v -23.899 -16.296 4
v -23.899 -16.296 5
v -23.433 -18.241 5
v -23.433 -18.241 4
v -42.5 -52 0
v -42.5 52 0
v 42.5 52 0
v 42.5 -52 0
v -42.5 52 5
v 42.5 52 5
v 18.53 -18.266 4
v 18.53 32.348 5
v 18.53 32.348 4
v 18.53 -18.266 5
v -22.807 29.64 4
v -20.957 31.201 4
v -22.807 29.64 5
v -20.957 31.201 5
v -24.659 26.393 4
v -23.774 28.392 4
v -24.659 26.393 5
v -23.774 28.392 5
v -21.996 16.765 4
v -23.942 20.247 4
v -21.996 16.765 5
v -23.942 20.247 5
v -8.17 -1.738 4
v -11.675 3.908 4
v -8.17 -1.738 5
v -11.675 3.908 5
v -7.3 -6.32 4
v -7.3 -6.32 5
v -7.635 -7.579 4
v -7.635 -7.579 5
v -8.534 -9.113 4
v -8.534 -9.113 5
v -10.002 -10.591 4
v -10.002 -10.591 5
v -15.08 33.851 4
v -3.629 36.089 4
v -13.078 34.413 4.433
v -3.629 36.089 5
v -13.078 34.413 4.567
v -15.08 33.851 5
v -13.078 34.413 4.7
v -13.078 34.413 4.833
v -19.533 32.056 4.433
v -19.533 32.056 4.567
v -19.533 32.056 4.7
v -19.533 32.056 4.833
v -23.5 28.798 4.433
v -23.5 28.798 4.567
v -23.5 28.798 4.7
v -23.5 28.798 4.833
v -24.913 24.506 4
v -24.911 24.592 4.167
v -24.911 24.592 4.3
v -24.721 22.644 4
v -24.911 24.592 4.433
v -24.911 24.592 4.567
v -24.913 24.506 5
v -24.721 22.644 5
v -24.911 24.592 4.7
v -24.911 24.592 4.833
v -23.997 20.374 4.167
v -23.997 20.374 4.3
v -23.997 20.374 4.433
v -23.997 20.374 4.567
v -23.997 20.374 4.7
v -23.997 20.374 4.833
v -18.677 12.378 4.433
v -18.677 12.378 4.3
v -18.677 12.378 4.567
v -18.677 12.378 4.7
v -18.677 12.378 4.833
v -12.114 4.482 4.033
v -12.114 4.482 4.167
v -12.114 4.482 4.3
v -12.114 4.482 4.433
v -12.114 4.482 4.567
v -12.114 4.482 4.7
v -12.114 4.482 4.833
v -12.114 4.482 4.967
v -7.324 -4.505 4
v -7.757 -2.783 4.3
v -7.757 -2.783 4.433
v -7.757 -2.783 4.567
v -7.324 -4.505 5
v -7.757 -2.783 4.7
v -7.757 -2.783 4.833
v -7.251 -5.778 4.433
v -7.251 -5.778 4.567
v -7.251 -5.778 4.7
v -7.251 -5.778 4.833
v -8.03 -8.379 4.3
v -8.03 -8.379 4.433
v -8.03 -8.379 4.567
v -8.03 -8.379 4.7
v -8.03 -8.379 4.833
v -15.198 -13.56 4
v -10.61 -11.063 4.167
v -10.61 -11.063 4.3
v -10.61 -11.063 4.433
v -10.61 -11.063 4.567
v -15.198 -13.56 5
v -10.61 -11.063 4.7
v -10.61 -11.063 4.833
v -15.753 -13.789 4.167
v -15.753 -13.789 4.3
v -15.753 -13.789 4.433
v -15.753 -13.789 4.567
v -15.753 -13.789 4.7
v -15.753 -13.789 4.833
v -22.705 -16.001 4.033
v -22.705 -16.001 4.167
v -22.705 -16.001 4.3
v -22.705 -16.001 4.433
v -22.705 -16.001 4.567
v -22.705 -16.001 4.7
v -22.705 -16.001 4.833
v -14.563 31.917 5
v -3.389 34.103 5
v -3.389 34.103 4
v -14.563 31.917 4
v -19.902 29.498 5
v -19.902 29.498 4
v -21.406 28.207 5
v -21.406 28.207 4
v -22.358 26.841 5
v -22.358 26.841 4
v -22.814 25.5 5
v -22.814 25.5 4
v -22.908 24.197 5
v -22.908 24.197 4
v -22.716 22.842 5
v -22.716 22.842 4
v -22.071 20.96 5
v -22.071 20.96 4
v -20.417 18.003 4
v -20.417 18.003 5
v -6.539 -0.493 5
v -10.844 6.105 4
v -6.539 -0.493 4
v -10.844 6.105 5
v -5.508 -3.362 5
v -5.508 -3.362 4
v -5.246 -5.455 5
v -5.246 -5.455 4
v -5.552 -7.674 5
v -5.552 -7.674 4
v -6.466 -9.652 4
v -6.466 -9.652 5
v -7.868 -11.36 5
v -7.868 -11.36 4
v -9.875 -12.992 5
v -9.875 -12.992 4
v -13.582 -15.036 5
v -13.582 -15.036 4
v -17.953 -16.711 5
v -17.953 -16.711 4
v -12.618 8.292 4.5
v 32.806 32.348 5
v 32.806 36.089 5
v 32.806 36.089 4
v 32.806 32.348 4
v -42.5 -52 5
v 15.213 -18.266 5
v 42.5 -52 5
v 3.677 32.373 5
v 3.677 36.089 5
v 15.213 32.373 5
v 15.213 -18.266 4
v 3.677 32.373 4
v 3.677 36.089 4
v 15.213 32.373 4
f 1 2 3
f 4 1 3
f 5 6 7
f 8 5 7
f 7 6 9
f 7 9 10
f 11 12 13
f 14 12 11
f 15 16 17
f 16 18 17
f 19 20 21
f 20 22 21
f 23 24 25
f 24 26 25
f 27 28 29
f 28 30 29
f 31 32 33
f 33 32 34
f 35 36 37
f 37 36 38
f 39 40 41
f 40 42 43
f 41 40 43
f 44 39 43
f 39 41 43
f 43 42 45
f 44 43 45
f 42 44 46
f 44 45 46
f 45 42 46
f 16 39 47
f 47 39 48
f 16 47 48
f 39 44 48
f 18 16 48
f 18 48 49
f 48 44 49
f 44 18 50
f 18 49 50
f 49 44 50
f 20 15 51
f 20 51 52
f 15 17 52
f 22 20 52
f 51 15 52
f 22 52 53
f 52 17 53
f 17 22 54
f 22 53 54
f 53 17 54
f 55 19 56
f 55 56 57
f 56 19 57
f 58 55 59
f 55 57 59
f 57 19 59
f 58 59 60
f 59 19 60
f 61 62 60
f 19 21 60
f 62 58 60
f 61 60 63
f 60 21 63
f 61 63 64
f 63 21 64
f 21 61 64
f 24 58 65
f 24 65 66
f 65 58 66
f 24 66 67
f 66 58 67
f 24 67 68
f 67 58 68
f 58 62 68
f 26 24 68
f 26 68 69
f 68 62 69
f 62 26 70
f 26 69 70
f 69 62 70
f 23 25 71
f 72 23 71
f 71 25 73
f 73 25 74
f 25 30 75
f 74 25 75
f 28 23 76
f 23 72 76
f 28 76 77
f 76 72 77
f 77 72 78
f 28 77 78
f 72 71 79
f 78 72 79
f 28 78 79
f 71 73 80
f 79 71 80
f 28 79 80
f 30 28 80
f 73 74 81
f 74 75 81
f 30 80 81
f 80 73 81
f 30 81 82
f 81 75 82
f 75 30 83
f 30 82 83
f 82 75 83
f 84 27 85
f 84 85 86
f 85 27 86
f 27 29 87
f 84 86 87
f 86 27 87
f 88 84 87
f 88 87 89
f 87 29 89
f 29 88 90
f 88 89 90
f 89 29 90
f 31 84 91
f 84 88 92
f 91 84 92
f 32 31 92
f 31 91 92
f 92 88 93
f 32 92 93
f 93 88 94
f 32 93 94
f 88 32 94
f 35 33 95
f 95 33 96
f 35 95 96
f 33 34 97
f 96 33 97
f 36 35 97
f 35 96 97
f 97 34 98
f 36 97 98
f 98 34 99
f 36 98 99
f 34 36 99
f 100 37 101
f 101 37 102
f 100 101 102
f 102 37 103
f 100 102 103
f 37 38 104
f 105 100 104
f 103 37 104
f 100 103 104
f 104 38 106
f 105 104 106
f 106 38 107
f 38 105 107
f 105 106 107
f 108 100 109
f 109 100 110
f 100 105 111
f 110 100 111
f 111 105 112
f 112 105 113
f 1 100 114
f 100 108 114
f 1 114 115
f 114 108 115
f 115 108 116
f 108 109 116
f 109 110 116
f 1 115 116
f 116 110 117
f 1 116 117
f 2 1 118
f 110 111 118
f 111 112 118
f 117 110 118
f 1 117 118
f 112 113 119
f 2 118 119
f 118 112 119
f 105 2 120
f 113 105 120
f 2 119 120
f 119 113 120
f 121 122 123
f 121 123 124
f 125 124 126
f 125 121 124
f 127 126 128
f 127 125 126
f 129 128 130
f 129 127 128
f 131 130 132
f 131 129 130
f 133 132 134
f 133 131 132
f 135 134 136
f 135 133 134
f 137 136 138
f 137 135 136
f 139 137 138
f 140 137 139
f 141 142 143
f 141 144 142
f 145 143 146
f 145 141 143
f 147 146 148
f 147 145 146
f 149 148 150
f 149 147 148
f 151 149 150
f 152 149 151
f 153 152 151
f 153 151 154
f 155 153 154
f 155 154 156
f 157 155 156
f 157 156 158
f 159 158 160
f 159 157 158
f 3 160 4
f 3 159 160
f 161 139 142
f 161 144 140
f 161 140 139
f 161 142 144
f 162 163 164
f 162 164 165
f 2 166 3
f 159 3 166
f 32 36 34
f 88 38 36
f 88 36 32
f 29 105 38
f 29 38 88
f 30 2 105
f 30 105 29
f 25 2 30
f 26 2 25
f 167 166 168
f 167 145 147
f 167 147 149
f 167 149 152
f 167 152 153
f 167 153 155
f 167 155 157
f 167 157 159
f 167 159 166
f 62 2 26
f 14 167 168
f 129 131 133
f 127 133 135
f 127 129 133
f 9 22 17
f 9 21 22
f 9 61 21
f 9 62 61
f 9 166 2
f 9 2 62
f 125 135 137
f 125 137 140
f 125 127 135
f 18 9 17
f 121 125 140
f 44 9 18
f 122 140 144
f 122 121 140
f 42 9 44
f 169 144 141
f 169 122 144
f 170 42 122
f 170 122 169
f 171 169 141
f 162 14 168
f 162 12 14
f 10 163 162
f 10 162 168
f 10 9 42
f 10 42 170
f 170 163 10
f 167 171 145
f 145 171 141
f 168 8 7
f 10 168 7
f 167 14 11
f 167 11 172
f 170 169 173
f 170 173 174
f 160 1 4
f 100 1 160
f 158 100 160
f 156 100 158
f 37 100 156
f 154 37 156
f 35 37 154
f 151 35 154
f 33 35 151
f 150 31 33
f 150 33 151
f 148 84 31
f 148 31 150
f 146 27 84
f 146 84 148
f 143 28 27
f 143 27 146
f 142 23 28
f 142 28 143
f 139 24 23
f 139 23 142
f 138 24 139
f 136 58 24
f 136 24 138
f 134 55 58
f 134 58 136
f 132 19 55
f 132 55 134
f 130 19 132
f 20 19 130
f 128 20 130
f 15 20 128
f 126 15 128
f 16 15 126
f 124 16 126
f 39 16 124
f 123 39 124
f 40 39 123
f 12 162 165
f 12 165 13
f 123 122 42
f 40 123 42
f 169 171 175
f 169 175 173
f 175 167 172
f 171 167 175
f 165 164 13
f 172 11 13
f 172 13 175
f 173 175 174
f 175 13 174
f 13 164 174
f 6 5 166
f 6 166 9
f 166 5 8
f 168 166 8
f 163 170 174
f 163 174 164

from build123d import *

# Parameters (mm, degrees)
ESQUISSE1_W             = 85
ESQUISSE1_H             = 104
BOSS_EXTRU_1_DEPTH      = 5
ENL_V_MAT_EXTRU_1_DEPTH = 1


with BuildPart() as part:
    # Esquisse1 → Boss.-Extru.1 (new body)
    with BuildSketch(Plane.XY):
        Rectangle(ESQUISSE1_W, ESQUISSE1_H)
    extrude(amount=BOSS_EXTRU_1_DEPTH)

    # Esquisse2 → Enlèv. mat.-Extru.1 (cut)
    with BuildSketch(Plane.XY.offset(5)):
        with BuildLine():
            Line((-3.388704743, 34.103347729), (-3.629372262, 36.088814713))
            add(Edge.make_bspline(
                [(-3.629372262, 36.088814713), (-4.08446723, 36.033650574), (-5.006701542, 35.9161817), (-6.746497307, 35.671464418), (-8.798619642, 35.338764173), (-11.051315829, 34.899553303), (-13.794606999, 34.259481961), (-16.756038002, 33.355809903), (-20.588465233, 31.672600674), (-23.248873274, 29.537403505), (-24.667920032, 26.786198992), (-25.012510364, 24.584115997), (-24.750697932, 22.431783349), (-23.816704413, 19.677670295), (-21.84557106, 16.358099799), (-18.729299599, 12.379297822), (-15.297978173, 8.393157934), (-12.02002896, 4.459655747), (-9.304947101, 0.658444927), (-7.548030079, -2.872596094), (-7.129469845, -5.366220488), (-7.41085698, -7.099431702), (-7.956615785, -8.371154177), (-8.945556146, -9.690172763), (-10.501310687, -11.060812544), (-12.710120912, -12.44358626), (-15.141117913, -13.572373646), (-17.46240655, -14.446520725), (-19.395427087, -15.084638487), (-21.175073092, -15.600848156), (-22.692644923, -16.001059417), (-23.500194879, -16.200847405), (-23.898925586, -16.296466212)],
                knots=[0, 0, 0, 0, 0.0078125, 0.015625, 0.03125, 0.046875, 0.0625, 0.09375, 0.125, 0.1875, 0.21875, 0.25, 0.28125, 0.3125, 0.375, 0.4375, 0.5, 0.5625, 0.625, 0.6875, 0.75, 0.78125, 0.8125, 0.84375, 0.875, 0.90625, 0.9375, 0.953125, 0.96875, 0.984375, 0.9921875, 1, 1, 1, 1], degree=3))
            Line((-23.898925586, -16.296466212), (-23.432532795, -18.24132553))
            add(Edge.make_bspline(
                [(-3.388704743, 34.103347729), (-33.854005817, 30.410509476), (-10.88452908, 9.31946477), (2.016071314, -12.138547096), (-23.432532795, -18.24132553)],
                knots=[0, 0, 0, 0, 0.521998932, 1, 1, 1, 1], degree=3))
        make_face()
        Polygon((3.677105146, 36.088814713), (32.805545913, 36.088814713), (32.805545913, 32.348096387), (18.529725933, 32.348096387), (18.529725933, -18.26617445), (15.213121291, -18.26617445), (15.213121291, 32.372945307), (3.677105146, 32.372945307), align=None)
    extrude(amount=-ENL_V_MAT_EXTRU_1_DEPTH, mode=Mode.SUBTRACT)


solid = part.part
